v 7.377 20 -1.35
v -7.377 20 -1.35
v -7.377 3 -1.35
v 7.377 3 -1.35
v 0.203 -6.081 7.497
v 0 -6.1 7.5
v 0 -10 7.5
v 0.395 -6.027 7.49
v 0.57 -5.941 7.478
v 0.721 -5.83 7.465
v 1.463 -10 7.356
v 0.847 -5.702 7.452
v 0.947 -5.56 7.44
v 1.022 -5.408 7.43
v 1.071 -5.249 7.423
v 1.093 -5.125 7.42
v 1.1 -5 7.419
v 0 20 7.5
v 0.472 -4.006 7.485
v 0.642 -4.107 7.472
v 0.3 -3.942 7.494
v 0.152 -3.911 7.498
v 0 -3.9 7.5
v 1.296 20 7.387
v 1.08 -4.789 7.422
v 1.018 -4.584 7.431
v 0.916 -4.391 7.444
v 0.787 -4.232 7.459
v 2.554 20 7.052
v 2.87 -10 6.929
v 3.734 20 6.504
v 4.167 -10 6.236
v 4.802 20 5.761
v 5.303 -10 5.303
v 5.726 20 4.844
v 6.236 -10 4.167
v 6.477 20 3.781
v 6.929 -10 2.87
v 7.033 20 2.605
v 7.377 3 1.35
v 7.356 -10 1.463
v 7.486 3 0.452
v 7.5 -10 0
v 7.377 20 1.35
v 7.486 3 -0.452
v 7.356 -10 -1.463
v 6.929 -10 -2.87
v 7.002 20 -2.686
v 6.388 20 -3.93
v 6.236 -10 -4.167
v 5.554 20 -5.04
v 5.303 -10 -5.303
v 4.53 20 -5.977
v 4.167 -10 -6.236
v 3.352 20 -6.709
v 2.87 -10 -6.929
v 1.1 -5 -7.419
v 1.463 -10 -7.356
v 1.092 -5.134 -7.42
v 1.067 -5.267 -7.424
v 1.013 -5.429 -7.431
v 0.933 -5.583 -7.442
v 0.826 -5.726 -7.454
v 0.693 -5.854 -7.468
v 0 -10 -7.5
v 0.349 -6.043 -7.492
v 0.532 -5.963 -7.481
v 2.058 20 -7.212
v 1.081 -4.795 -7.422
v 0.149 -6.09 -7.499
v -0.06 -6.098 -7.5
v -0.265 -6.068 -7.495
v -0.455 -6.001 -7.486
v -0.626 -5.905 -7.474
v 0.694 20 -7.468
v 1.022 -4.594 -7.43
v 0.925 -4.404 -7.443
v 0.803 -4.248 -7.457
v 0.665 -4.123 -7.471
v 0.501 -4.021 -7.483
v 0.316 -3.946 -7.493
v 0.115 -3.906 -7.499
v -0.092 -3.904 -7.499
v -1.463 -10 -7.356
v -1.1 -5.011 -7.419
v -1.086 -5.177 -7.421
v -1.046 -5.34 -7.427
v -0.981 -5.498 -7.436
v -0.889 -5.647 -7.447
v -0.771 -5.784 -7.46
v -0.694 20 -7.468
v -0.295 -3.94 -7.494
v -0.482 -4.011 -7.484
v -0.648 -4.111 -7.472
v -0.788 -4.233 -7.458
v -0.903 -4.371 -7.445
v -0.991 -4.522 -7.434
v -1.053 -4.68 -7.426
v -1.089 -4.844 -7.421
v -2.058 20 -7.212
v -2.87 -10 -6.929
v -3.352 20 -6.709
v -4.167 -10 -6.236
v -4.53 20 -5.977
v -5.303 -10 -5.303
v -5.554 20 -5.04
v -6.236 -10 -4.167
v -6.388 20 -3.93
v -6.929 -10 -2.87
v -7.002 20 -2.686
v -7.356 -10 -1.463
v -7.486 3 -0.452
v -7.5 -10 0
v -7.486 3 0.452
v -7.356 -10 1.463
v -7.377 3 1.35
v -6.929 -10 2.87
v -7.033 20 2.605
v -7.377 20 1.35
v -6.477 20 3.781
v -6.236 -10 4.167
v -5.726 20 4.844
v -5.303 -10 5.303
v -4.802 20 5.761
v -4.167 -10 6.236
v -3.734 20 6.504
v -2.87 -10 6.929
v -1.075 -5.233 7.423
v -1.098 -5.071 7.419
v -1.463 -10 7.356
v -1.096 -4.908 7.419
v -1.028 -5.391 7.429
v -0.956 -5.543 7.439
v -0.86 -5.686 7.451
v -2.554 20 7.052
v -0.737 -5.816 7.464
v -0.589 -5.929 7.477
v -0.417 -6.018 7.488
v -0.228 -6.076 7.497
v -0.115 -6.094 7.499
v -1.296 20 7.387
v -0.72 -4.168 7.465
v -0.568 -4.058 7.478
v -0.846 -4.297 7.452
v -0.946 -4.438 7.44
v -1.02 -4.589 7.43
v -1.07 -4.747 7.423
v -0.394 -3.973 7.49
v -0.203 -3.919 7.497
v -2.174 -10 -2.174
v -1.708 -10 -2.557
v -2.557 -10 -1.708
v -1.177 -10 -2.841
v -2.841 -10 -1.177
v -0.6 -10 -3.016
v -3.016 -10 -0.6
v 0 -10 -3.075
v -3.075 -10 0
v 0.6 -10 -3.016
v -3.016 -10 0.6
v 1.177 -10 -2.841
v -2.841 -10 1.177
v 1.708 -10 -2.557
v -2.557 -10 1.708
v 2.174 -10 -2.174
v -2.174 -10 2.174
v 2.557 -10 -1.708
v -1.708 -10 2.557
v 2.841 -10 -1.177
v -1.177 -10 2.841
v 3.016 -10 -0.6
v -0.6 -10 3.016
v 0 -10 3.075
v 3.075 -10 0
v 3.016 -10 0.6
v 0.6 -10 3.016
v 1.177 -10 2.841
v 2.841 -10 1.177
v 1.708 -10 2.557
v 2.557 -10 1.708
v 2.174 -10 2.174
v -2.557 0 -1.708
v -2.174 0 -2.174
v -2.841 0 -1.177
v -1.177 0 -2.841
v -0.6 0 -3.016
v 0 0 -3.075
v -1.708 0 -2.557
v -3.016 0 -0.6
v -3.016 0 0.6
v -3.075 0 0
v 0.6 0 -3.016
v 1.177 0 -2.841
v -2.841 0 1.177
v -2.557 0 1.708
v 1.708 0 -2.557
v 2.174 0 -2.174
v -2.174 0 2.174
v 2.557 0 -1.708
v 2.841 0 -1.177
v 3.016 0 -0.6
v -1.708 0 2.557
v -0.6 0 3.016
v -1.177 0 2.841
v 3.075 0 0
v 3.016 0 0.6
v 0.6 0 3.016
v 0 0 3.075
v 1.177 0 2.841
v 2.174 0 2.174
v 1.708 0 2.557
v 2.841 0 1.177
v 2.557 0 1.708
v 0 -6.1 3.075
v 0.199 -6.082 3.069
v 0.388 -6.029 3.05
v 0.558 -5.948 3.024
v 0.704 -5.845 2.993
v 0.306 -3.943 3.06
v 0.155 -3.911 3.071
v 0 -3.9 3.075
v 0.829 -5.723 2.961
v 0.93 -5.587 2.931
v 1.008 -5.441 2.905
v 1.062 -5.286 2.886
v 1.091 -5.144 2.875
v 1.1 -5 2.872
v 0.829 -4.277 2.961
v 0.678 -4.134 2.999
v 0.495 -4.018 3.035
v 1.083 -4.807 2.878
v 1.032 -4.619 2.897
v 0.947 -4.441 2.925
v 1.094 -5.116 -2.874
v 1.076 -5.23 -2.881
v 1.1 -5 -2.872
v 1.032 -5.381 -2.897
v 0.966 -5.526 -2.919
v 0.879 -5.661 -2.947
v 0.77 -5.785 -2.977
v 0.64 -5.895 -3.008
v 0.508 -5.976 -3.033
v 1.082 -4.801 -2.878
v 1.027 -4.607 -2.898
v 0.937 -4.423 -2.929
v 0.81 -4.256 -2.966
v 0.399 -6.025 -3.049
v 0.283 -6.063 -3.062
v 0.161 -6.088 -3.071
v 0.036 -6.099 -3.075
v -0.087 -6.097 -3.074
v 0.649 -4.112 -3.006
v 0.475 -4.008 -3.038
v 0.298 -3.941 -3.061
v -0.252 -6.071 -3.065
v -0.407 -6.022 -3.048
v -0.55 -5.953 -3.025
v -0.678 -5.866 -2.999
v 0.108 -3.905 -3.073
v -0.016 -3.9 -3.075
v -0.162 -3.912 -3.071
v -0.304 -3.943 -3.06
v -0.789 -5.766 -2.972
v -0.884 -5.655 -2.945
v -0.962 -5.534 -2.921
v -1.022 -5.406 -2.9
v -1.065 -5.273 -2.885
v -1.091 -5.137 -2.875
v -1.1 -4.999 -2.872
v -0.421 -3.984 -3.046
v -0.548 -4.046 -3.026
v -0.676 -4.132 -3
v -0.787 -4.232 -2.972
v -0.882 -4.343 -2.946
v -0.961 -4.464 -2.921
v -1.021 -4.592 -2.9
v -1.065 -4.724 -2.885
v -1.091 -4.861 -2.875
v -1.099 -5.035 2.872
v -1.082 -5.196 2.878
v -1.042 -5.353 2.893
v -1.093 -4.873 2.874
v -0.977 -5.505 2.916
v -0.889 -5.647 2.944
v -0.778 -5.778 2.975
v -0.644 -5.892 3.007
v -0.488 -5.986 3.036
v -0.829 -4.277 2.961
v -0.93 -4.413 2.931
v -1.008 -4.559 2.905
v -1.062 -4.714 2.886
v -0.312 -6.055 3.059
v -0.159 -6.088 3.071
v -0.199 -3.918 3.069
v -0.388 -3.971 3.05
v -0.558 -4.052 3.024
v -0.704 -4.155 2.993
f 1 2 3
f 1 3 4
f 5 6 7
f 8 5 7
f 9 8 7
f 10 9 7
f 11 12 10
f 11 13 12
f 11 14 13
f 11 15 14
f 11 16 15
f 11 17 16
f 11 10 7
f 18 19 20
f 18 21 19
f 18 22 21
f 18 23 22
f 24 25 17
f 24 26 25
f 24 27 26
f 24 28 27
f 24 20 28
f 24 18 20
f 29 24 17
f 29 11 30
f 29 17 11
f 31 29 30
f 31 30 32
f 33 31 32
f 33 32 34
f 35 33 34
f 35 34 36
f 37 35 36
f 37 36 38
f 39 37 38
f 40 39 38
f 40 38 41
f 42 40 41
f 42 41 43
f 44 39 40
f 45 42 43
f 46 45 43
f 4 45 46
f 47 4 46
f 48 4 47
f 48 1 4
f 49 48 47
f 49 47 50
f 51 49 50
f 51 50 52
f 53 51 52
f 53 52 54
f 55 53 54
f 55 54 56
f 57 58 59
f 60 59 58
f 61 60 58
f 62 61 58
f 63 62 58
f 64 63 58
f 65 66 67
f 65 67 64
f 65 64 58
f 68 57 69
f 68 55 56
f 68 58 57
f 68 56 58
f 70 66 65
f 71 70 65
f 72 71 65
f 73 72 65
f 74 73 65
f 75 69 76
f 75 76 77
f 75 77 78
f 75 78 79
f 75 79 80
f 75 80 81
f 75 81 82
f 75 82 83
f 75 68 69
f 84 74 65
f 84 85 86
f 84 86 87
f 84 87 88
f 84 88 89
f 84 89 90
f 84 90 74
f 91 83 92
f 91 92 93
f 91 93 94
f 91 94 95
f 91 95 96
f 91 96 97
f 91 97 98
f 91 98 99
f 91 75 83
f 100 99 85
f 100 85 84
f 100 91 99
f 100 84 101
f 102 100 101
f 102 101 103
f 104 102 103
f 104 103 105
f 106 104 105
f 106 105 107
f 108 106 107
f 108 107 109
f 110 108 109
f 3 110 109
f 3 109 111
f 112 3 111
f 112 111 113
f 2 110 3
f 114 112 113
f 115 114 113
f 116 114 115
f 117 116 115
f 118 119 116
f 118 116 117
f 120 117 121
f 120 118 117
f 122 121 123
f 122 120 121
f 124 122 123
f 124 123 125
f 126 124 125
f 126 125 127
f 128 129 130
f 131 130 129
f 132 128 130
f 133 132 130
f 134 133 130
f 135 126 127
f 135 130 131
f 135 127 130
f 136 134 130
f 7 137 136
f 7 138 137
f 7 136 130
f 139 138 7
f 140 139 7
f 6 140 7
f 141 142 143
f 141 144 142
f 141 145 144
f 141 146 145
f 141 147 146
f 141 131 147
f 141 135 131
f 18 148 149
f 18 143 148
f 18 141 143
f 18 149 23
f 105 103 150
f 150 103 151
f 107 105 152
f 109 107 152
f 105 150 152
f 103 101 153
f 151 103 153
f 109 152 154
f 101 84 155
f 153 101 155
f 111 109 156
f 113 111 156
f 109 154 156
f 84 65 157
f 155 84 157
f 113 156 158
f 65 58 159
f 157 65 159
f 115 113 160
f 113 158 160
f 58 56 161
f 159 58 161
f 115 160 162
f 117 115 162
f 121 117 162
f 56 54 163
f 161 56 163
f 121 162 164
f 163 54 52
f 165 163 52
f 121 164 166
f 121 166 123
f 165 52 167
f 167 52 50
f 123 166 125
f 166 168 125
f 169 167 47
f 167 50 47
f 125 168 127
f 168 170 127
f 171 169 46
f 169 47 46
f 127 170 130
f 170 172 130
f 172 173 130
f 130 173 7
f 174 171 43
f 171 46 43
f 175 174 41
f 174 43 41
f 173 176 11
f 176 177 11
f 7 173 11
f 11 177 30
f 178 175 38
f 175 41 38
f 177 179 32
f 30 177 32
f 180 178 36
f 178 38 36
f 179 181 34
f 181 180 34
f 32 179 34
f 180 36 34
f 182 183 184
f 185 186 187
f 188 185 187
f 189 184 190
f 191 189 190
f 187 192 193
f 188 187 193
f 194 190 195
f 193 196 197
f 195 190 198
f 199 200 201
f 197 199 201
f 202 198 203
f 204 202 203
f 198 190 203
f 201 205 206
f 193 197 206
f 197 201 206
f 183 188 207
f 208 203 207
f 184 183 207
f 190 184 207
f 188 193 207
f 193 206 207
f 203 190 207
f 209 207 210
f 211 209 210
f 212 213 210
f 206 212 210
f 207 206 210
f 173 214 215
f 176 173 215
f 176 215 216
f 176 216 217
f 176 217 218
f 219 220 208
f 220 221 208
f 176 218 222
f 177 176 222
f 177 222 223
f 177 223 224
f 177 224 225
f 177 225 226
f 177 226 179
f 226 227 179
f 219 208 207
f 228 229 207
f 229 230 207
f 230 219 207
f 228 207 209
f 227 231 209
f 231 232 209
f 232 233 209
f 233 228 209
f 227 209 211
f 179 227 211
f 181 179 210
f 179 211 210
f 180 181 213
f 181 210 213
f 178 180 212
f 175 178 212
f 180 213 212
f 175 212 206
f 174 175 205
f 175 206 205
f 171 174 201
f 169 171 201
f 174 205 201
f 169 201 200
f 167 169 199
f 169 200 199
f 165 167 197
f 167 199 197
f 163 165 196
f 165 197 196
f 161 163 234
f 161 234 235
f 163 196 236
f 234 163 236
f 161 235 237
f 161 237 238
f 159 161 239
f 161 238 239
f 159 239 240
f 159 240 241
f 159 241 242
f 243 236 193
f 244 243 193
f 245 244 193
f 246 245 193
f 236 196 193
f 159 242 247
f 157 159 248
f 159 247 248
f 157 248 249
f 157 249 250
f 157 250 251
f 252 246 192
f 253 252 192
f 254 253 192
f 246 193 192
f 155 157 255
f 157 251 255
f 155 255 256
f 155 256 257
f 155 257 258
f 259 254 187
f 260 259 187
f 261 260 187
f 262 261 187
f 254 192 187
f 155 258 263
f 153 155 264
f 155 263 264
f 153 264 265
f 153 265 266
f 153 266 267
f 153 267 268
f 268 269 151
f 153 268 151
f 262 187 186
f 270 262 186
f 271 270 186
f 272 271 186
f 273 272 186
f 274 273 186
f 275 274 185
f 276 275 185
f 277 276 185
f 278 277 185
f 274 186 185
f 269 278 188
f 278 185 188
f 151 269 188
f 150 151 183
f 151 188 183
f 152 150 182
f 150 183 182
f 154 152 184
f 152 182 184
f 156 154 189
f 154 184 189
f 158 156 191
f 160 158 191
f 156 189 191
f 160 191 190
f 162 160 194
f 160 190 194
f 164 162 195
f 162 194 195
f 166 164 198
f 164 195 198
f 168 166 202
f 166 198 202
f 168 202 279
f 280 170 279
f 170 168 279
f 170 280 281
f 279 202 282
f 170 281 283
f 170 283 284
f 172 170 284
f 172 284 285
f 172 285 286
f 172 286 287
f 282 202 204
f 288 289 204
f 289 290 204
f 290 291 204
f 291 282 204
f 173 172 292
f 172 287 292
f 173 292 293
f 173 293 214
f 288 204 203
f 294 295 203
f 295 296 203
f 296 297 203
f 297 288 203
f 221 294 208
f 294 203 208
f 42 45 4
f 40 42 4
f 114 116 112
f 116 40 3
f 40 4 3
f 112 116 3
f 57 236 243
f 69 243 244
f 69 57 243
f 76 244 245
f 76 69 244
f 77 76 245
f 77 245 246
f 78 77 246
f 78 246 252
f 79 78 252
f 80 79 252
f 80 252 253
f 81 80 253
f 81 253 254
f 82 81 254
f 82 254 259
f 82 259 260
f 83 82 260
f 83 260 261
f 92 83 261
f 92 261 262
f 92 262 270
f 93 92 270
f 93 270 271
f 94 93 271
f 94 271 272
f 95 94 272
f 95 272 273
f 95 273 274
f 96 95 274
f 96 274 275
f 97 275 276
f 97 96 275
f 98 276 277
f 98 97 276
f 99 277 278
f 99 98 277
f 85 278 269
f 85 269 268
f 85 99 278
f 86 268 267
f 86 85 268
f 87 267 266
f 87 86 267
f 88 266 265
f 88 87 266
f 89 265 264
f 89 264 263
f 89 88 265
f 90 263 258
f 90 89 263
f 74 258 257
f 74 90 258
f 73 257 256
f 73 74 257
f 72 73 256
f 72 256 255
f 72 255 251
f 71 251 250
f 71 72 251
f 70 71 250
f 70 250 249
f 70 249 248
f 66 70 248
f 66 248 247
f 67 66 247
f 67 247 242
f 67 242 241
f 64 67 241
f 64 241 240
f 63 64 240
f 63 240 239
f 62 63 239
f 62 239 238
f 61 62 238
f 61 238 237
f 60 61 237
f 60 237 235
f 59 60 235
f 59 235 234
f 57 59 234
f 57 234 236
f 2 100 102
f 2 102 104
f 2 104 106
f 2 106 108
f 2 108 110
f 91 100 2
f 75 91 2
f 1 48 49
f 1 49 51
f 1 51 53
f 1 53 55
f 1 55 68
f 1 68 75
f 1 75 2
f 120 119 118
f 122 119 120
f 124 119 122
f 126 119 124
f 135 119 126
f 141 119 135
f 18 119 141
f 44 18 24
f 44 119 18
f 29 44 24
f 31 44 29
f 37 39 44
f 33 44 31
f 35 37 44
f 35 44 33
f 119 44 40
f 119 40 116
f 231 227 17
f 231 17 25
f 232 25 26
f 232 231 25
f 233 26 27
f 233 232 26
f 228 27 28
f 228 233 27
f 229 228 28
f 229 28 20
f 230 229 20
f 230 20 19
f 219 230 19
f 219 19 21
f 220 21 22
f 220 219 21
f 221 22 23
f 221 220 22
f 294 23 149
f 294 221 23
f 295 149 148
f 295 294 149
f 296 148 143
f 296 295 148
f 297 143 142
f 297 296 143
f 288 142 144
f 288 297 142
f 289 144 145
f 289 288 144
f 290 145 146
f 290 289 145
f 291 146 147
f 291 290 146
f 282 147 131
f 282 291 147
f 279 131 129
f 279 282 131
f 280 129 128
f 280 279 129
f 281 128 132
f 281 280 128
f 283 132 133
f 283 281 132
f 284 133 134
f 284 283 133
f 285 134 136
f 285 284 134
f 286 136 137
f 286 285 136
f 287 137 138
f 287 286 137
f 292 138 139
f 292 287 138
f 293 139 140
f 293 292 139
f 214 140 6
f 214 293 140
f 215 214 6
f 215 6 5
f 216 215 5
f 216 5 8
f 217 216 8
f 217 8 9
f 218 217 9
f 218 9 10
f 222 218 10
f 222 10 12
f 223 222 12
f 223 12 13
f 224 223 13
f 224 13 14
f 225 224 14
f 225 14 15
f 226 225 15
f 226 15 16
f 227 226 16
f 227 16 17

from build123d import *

# Parameters (mm, degrees)
SKETCH1_R               = 7.5
SKETCH1_R_2             = 3.075
BOSS_EXTRUDE1_DEPTH     = 10
BOSS_EXTRUDE2_START     = 20
SKETCH1_3_R             = 7.5
BOSS_EXTRUDE2_DEPTH     = 20
CUT_EXTRUDE1_DEPTH      = 17
CUT_EXTRUDE2_DEPTH      = 23.638462845
CUT_EXTRUDE2_DEPTH_BACK = 23.638462845
SKETCH3_R               = 1.1


with BuildPart() as part:
    # Sketch1 → Boss-Extrude1 (new body)
    with BuildSketch(Plane(origin=(0, 0, 0), x_dir=(1, 0, 0), z_dir=(0, 1, 0))):
        Circle(SKETCH1_R)
        Circle(SKETCH1_R_2, mode=Mode.SUBTRACT)
    extrude(amount=-BOSS_EXTRUDE1_DEPTH)

    # Sketch1<3> → Boss-Extrude2 (add)
    with BuildSketch(Plane(origin=(0, 0, 0), x_dir=(1, 0, 0), z_dir=(0, 1, 0)).offset(BOSS_EXTRUDE2_START)):
        Circle(SKETCH1_3_R)
    extrude(amount=-BOSS_EXTRUDE2_DEPTH)

    # Sketch2 → Cut-Extrude1 (cut)
    with BuildSketch(Plane(origin=(0, 20, 0), x_dir=(1, 0, 0), z_dir=(0, 1, 0))):
        with BuildLine():
            Line((-7.377499576, 1.35), (7.377499576, 1.35))
            ThreePointArc((7.377499576, 1.35), (7.5, 0), (7.377499576, -1.35))
            Line((7.377499576, -1.35), (-7.377499576, -1.35))
            ThreePointArc((-7.377499576, -1.35), (-7.5, 0), (-7.377499576, 1.35))
        make_face()
    extrude(amount=-CUT_EXTRUDE1_DEPTH, mode=Mode.SUBTRACT)

    # Sketch3 → Cut-Extrude2 (cut, two sides: drawn at the far end of the back side and taken through both)
    with BuildSketch(Plane.XY.offset(-CUT_EXTRUDE2_DEPTH_BACK)):
        with Locations((0, -5)):
            Circle(SKETCH3_R)
    extrude(amount=CUT_EXTRUDE2_DEPTH + CUT_EXTRUDE2_DEPTH_BACK, mode=Mode.SUBTRACT)


solid = part.part
